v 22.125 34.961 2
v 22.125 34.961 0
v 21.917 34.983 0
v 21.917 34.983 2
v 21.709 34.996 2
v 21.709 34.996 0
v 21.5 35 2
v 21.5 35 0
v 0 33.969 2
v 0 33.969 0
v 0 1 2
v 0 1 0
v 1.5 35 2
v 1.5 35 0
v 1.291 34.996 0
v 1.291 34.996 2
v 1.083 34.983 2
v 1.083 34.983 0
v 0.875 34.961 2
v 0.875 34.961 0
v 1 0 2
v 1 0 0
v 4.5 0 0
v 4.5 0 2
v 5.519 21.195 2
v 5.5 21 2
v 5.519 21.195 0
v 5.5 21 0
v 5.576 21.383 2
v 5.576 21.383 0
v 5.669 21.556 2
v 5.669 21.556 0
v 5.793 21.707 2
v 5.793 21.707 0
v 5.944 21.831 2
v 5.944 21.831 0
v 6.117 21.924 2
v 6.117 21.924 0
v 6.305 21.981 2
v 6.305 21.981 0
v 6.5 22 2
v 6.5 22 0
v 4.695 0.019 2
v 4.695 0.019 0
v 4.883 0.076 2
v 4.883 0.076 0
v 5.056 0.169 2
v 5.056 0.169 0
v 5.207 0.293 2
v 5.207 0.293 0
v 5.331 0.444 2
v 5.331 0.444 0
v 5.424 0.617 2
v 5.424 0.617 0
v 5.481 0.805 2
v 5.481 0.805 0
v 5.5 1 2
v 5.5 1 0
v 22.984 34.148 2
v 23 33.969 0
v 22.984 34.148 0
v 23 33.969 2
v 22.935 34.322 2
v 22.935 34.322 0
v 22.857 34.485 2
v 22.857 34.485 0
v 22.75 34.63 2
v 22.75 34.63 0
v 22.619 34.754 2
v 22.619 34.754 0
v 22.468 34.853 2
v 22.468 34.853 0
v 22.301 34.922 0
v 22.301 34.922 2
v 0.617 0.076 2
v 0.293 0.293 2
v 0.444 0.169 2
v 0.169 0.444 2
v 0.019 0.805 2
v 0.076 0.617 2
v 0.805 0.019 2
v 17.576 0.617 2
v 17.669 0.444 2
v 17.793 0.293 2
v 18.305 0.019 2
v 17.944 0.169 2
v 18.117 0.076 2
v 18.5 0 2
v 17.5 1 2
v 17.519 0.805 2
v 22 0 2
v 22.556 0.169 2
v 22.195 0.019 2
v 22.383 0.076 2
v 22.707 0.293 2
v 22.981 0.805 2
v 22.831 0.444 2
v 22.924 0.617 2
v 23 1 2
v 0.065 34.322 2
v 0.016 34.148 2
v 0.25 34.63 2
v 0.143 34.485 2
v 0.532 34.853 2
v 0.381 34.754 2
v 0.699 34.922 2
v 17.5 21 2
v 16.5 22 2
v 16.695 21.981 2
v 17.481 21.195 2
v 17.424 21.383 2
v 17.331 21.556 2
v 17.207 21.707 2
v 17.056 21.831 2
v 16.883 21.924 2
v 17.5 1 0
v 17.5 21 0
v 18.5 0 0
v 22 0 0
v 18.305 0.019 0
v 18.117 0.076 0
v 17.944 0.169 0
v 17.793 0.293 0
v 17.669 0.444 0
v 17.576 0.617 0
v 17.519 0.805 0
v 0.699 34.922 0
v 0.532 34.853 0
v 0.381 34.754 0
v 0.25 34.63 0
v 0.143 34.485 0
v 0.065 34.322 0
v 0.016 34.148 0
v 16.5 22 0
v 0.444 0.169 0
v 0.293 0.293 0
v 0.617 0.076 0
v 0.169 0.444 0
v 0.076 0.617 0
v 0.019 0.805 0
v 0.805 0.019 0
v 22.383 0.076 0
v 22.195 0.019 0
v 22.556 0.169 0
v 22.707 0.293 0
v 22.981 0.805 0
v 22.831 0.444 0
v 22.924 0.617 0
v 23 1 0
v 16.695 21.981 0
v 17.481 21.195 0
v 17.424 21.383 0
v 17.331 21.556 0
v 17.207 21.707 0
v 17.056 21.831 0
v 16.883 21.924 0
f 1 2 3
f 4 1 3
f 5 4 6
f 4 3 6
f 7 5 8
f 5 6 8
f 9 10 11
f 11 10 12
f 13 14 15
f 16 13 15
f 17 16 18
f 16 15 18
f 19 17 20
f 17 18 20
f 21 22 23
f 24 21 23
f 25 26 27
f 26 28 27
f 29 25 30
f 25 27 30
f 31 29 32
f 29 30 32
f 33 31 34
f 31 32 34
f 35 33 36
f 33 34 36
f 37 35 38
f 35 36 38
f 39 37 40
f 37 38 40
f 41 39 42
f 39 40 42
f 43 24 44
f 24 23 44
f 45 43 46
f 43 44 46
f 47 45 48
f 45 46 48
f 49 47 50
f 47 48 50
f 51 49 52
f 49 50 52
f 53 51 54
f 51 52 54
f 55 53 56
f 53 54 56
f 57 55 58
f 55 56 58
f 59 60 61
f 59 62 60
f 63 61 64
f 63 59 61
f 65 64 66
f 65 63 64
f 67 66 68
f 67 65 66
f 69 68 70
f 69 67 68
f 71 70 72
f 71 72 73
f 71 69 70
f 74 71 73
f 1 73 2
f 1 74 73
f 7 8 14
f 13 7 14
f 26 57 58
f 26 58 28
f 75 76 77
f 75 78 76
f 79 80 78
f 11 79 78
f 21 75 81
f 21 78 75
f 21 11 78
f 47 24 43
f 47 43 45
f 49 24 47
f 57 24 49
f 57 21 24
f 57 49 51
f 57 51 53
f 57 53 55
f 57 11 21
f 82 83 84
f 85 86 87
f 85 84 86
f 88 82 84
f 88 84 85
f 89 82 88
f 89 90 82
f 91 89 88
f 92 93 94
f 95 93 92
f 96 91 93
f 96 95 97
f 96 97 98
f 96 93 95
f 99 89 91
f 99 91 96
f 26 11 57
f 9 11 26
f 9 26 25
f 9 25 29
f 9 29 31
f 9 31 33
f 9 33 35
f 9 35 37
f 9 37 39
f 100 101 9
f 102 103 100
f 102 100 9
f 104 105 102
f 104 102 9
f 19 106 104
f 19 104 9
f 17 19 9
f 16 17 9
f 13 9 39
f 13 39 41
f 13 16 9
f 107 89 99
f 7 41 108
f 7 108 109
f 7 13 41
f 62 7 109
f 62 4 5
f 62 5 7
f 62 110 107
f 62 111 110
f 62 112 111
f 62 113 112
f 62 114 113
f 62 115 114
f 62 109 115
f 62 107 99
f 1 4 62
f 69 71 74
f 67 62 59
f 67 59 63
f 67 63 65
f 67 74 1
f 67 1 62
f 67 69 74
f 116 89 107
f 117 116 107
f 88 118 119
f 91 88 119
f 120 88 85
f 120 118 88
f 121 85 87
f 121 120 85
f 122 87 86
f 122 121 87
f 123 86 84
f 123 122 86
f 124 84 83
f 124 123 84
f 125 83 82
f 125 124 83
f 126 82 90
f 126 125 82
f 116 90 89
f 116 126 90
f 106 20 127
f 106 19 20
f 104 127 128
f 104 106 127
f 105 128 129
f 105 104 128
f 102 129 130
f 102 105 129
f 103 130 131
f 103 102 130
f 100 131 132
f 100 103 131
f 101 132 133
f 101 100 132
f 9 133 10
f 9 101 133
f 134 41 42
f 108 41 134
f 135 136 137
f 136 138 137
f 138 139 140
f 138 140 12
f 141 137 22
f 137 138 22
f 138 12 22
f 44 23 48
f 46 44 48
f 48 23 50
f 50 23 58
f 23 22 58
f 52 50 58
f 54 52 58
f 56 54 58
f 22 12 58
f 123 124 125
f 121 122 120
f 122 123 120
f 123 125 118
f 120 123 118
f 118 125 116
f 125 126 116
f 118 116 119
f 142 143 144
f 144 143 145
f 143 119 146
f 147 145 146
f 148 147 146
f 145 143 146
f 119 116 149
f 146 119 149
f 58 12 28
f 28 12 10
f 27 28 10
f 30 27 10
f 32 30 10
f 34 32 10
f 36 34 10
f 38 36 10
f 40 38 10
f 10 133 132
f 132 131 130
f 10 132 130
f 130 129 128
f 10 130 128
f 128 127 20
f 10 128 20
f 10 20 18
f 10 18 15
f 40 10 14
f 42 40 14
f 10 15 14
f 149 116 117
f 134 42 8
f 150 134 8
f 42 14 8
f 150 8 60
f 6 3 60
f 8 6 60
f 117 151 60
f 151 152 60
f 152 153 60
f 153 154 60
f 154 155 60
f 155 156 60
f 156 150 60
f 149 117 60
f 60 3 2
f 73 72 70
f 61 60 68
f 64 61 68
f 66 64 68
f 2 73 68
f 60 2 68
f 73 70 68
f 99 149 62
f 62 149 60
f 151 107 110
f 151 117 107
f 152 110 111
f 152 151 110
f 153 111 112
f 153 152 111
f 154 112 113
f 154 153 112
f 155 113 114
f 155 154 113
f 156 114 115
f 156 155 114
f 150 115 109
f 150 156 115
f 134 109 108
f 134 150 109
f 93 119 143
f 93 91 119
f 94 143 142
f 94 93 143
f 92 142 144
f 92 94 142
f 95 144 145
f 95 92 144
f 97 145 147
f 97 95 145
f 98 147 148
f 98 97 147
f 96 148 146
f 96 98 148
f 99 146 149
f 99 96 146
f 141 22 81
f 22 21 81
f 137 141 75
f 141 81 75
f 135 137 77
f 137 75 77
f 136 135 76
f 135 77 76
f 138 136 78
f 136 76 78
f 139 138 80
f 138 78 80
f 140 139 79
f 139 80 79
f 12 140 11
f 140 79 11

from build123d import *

# Parameters (mm, degrees)
BOSS_EXTRUDE1_DEPTH = 2
FILLET2_R           = 1
SKETCH2_W           = 12
SKETCH2_H           = 22
CUT_EXTRUDE1_DEPTH  = 10
FILLET3_R           = 1


with BuildPart() as part:
    # Sketch1 → Boss-Extrude1 (new body)
    with BuildSketch(Plane.XY):
        with BuildLine():
            Line((0, 0), (23, 0))
            Line((23, 0), (23, 34.769696007))
            ThreePointArc((23, 34.769696007), (22.258788496, 34.942088629), (21.5, 35))
            Line((21.5, 35), (1.5, 35))
            ThreePointArc((1.5, 35), (0.741211504, 34.942088629), (0, 34.769696007))
            Line((0, 34.769696007), (0, 0))
        make_face()
    extrude(amount=BOSS_EXTRUDE1_DEPTH)

    # Fillet2
    fillet2_edges = [part.edges().sort_by_distance(p)[0] for p in [
        (0, 34.769696007, 1),
        (23, 34.769696007, 1),
        (23, 0, 1),
        (0, 0, 1),
    ]]
    fillet(fillet2_edges, radius=FILLET2_R)

    # Sketch2 → Cut-Extrude1 (cut)
    with BuildSketch(Plane.XY.offset(2)):
        with Locations((11.5, 11)):
            Rectangle(SKETCH2_W, SKETCH2_H)
    extrude(amount=-CUT_EXTRUDE1_DEPTH, mode=Mode.SUBTRACT)

    # Fillet3
    fillet3_edges = [part.edges().sort_by_distance(p)[0] for p in [
        (5.5, 0, 1),
        (5.5, 22, 1),
        (17.5, 22, 1),
        (17.5, 0, 1),
    ]]
    fillet(fillet3_edges, radius=FILLET3_R)


solid = part.part
